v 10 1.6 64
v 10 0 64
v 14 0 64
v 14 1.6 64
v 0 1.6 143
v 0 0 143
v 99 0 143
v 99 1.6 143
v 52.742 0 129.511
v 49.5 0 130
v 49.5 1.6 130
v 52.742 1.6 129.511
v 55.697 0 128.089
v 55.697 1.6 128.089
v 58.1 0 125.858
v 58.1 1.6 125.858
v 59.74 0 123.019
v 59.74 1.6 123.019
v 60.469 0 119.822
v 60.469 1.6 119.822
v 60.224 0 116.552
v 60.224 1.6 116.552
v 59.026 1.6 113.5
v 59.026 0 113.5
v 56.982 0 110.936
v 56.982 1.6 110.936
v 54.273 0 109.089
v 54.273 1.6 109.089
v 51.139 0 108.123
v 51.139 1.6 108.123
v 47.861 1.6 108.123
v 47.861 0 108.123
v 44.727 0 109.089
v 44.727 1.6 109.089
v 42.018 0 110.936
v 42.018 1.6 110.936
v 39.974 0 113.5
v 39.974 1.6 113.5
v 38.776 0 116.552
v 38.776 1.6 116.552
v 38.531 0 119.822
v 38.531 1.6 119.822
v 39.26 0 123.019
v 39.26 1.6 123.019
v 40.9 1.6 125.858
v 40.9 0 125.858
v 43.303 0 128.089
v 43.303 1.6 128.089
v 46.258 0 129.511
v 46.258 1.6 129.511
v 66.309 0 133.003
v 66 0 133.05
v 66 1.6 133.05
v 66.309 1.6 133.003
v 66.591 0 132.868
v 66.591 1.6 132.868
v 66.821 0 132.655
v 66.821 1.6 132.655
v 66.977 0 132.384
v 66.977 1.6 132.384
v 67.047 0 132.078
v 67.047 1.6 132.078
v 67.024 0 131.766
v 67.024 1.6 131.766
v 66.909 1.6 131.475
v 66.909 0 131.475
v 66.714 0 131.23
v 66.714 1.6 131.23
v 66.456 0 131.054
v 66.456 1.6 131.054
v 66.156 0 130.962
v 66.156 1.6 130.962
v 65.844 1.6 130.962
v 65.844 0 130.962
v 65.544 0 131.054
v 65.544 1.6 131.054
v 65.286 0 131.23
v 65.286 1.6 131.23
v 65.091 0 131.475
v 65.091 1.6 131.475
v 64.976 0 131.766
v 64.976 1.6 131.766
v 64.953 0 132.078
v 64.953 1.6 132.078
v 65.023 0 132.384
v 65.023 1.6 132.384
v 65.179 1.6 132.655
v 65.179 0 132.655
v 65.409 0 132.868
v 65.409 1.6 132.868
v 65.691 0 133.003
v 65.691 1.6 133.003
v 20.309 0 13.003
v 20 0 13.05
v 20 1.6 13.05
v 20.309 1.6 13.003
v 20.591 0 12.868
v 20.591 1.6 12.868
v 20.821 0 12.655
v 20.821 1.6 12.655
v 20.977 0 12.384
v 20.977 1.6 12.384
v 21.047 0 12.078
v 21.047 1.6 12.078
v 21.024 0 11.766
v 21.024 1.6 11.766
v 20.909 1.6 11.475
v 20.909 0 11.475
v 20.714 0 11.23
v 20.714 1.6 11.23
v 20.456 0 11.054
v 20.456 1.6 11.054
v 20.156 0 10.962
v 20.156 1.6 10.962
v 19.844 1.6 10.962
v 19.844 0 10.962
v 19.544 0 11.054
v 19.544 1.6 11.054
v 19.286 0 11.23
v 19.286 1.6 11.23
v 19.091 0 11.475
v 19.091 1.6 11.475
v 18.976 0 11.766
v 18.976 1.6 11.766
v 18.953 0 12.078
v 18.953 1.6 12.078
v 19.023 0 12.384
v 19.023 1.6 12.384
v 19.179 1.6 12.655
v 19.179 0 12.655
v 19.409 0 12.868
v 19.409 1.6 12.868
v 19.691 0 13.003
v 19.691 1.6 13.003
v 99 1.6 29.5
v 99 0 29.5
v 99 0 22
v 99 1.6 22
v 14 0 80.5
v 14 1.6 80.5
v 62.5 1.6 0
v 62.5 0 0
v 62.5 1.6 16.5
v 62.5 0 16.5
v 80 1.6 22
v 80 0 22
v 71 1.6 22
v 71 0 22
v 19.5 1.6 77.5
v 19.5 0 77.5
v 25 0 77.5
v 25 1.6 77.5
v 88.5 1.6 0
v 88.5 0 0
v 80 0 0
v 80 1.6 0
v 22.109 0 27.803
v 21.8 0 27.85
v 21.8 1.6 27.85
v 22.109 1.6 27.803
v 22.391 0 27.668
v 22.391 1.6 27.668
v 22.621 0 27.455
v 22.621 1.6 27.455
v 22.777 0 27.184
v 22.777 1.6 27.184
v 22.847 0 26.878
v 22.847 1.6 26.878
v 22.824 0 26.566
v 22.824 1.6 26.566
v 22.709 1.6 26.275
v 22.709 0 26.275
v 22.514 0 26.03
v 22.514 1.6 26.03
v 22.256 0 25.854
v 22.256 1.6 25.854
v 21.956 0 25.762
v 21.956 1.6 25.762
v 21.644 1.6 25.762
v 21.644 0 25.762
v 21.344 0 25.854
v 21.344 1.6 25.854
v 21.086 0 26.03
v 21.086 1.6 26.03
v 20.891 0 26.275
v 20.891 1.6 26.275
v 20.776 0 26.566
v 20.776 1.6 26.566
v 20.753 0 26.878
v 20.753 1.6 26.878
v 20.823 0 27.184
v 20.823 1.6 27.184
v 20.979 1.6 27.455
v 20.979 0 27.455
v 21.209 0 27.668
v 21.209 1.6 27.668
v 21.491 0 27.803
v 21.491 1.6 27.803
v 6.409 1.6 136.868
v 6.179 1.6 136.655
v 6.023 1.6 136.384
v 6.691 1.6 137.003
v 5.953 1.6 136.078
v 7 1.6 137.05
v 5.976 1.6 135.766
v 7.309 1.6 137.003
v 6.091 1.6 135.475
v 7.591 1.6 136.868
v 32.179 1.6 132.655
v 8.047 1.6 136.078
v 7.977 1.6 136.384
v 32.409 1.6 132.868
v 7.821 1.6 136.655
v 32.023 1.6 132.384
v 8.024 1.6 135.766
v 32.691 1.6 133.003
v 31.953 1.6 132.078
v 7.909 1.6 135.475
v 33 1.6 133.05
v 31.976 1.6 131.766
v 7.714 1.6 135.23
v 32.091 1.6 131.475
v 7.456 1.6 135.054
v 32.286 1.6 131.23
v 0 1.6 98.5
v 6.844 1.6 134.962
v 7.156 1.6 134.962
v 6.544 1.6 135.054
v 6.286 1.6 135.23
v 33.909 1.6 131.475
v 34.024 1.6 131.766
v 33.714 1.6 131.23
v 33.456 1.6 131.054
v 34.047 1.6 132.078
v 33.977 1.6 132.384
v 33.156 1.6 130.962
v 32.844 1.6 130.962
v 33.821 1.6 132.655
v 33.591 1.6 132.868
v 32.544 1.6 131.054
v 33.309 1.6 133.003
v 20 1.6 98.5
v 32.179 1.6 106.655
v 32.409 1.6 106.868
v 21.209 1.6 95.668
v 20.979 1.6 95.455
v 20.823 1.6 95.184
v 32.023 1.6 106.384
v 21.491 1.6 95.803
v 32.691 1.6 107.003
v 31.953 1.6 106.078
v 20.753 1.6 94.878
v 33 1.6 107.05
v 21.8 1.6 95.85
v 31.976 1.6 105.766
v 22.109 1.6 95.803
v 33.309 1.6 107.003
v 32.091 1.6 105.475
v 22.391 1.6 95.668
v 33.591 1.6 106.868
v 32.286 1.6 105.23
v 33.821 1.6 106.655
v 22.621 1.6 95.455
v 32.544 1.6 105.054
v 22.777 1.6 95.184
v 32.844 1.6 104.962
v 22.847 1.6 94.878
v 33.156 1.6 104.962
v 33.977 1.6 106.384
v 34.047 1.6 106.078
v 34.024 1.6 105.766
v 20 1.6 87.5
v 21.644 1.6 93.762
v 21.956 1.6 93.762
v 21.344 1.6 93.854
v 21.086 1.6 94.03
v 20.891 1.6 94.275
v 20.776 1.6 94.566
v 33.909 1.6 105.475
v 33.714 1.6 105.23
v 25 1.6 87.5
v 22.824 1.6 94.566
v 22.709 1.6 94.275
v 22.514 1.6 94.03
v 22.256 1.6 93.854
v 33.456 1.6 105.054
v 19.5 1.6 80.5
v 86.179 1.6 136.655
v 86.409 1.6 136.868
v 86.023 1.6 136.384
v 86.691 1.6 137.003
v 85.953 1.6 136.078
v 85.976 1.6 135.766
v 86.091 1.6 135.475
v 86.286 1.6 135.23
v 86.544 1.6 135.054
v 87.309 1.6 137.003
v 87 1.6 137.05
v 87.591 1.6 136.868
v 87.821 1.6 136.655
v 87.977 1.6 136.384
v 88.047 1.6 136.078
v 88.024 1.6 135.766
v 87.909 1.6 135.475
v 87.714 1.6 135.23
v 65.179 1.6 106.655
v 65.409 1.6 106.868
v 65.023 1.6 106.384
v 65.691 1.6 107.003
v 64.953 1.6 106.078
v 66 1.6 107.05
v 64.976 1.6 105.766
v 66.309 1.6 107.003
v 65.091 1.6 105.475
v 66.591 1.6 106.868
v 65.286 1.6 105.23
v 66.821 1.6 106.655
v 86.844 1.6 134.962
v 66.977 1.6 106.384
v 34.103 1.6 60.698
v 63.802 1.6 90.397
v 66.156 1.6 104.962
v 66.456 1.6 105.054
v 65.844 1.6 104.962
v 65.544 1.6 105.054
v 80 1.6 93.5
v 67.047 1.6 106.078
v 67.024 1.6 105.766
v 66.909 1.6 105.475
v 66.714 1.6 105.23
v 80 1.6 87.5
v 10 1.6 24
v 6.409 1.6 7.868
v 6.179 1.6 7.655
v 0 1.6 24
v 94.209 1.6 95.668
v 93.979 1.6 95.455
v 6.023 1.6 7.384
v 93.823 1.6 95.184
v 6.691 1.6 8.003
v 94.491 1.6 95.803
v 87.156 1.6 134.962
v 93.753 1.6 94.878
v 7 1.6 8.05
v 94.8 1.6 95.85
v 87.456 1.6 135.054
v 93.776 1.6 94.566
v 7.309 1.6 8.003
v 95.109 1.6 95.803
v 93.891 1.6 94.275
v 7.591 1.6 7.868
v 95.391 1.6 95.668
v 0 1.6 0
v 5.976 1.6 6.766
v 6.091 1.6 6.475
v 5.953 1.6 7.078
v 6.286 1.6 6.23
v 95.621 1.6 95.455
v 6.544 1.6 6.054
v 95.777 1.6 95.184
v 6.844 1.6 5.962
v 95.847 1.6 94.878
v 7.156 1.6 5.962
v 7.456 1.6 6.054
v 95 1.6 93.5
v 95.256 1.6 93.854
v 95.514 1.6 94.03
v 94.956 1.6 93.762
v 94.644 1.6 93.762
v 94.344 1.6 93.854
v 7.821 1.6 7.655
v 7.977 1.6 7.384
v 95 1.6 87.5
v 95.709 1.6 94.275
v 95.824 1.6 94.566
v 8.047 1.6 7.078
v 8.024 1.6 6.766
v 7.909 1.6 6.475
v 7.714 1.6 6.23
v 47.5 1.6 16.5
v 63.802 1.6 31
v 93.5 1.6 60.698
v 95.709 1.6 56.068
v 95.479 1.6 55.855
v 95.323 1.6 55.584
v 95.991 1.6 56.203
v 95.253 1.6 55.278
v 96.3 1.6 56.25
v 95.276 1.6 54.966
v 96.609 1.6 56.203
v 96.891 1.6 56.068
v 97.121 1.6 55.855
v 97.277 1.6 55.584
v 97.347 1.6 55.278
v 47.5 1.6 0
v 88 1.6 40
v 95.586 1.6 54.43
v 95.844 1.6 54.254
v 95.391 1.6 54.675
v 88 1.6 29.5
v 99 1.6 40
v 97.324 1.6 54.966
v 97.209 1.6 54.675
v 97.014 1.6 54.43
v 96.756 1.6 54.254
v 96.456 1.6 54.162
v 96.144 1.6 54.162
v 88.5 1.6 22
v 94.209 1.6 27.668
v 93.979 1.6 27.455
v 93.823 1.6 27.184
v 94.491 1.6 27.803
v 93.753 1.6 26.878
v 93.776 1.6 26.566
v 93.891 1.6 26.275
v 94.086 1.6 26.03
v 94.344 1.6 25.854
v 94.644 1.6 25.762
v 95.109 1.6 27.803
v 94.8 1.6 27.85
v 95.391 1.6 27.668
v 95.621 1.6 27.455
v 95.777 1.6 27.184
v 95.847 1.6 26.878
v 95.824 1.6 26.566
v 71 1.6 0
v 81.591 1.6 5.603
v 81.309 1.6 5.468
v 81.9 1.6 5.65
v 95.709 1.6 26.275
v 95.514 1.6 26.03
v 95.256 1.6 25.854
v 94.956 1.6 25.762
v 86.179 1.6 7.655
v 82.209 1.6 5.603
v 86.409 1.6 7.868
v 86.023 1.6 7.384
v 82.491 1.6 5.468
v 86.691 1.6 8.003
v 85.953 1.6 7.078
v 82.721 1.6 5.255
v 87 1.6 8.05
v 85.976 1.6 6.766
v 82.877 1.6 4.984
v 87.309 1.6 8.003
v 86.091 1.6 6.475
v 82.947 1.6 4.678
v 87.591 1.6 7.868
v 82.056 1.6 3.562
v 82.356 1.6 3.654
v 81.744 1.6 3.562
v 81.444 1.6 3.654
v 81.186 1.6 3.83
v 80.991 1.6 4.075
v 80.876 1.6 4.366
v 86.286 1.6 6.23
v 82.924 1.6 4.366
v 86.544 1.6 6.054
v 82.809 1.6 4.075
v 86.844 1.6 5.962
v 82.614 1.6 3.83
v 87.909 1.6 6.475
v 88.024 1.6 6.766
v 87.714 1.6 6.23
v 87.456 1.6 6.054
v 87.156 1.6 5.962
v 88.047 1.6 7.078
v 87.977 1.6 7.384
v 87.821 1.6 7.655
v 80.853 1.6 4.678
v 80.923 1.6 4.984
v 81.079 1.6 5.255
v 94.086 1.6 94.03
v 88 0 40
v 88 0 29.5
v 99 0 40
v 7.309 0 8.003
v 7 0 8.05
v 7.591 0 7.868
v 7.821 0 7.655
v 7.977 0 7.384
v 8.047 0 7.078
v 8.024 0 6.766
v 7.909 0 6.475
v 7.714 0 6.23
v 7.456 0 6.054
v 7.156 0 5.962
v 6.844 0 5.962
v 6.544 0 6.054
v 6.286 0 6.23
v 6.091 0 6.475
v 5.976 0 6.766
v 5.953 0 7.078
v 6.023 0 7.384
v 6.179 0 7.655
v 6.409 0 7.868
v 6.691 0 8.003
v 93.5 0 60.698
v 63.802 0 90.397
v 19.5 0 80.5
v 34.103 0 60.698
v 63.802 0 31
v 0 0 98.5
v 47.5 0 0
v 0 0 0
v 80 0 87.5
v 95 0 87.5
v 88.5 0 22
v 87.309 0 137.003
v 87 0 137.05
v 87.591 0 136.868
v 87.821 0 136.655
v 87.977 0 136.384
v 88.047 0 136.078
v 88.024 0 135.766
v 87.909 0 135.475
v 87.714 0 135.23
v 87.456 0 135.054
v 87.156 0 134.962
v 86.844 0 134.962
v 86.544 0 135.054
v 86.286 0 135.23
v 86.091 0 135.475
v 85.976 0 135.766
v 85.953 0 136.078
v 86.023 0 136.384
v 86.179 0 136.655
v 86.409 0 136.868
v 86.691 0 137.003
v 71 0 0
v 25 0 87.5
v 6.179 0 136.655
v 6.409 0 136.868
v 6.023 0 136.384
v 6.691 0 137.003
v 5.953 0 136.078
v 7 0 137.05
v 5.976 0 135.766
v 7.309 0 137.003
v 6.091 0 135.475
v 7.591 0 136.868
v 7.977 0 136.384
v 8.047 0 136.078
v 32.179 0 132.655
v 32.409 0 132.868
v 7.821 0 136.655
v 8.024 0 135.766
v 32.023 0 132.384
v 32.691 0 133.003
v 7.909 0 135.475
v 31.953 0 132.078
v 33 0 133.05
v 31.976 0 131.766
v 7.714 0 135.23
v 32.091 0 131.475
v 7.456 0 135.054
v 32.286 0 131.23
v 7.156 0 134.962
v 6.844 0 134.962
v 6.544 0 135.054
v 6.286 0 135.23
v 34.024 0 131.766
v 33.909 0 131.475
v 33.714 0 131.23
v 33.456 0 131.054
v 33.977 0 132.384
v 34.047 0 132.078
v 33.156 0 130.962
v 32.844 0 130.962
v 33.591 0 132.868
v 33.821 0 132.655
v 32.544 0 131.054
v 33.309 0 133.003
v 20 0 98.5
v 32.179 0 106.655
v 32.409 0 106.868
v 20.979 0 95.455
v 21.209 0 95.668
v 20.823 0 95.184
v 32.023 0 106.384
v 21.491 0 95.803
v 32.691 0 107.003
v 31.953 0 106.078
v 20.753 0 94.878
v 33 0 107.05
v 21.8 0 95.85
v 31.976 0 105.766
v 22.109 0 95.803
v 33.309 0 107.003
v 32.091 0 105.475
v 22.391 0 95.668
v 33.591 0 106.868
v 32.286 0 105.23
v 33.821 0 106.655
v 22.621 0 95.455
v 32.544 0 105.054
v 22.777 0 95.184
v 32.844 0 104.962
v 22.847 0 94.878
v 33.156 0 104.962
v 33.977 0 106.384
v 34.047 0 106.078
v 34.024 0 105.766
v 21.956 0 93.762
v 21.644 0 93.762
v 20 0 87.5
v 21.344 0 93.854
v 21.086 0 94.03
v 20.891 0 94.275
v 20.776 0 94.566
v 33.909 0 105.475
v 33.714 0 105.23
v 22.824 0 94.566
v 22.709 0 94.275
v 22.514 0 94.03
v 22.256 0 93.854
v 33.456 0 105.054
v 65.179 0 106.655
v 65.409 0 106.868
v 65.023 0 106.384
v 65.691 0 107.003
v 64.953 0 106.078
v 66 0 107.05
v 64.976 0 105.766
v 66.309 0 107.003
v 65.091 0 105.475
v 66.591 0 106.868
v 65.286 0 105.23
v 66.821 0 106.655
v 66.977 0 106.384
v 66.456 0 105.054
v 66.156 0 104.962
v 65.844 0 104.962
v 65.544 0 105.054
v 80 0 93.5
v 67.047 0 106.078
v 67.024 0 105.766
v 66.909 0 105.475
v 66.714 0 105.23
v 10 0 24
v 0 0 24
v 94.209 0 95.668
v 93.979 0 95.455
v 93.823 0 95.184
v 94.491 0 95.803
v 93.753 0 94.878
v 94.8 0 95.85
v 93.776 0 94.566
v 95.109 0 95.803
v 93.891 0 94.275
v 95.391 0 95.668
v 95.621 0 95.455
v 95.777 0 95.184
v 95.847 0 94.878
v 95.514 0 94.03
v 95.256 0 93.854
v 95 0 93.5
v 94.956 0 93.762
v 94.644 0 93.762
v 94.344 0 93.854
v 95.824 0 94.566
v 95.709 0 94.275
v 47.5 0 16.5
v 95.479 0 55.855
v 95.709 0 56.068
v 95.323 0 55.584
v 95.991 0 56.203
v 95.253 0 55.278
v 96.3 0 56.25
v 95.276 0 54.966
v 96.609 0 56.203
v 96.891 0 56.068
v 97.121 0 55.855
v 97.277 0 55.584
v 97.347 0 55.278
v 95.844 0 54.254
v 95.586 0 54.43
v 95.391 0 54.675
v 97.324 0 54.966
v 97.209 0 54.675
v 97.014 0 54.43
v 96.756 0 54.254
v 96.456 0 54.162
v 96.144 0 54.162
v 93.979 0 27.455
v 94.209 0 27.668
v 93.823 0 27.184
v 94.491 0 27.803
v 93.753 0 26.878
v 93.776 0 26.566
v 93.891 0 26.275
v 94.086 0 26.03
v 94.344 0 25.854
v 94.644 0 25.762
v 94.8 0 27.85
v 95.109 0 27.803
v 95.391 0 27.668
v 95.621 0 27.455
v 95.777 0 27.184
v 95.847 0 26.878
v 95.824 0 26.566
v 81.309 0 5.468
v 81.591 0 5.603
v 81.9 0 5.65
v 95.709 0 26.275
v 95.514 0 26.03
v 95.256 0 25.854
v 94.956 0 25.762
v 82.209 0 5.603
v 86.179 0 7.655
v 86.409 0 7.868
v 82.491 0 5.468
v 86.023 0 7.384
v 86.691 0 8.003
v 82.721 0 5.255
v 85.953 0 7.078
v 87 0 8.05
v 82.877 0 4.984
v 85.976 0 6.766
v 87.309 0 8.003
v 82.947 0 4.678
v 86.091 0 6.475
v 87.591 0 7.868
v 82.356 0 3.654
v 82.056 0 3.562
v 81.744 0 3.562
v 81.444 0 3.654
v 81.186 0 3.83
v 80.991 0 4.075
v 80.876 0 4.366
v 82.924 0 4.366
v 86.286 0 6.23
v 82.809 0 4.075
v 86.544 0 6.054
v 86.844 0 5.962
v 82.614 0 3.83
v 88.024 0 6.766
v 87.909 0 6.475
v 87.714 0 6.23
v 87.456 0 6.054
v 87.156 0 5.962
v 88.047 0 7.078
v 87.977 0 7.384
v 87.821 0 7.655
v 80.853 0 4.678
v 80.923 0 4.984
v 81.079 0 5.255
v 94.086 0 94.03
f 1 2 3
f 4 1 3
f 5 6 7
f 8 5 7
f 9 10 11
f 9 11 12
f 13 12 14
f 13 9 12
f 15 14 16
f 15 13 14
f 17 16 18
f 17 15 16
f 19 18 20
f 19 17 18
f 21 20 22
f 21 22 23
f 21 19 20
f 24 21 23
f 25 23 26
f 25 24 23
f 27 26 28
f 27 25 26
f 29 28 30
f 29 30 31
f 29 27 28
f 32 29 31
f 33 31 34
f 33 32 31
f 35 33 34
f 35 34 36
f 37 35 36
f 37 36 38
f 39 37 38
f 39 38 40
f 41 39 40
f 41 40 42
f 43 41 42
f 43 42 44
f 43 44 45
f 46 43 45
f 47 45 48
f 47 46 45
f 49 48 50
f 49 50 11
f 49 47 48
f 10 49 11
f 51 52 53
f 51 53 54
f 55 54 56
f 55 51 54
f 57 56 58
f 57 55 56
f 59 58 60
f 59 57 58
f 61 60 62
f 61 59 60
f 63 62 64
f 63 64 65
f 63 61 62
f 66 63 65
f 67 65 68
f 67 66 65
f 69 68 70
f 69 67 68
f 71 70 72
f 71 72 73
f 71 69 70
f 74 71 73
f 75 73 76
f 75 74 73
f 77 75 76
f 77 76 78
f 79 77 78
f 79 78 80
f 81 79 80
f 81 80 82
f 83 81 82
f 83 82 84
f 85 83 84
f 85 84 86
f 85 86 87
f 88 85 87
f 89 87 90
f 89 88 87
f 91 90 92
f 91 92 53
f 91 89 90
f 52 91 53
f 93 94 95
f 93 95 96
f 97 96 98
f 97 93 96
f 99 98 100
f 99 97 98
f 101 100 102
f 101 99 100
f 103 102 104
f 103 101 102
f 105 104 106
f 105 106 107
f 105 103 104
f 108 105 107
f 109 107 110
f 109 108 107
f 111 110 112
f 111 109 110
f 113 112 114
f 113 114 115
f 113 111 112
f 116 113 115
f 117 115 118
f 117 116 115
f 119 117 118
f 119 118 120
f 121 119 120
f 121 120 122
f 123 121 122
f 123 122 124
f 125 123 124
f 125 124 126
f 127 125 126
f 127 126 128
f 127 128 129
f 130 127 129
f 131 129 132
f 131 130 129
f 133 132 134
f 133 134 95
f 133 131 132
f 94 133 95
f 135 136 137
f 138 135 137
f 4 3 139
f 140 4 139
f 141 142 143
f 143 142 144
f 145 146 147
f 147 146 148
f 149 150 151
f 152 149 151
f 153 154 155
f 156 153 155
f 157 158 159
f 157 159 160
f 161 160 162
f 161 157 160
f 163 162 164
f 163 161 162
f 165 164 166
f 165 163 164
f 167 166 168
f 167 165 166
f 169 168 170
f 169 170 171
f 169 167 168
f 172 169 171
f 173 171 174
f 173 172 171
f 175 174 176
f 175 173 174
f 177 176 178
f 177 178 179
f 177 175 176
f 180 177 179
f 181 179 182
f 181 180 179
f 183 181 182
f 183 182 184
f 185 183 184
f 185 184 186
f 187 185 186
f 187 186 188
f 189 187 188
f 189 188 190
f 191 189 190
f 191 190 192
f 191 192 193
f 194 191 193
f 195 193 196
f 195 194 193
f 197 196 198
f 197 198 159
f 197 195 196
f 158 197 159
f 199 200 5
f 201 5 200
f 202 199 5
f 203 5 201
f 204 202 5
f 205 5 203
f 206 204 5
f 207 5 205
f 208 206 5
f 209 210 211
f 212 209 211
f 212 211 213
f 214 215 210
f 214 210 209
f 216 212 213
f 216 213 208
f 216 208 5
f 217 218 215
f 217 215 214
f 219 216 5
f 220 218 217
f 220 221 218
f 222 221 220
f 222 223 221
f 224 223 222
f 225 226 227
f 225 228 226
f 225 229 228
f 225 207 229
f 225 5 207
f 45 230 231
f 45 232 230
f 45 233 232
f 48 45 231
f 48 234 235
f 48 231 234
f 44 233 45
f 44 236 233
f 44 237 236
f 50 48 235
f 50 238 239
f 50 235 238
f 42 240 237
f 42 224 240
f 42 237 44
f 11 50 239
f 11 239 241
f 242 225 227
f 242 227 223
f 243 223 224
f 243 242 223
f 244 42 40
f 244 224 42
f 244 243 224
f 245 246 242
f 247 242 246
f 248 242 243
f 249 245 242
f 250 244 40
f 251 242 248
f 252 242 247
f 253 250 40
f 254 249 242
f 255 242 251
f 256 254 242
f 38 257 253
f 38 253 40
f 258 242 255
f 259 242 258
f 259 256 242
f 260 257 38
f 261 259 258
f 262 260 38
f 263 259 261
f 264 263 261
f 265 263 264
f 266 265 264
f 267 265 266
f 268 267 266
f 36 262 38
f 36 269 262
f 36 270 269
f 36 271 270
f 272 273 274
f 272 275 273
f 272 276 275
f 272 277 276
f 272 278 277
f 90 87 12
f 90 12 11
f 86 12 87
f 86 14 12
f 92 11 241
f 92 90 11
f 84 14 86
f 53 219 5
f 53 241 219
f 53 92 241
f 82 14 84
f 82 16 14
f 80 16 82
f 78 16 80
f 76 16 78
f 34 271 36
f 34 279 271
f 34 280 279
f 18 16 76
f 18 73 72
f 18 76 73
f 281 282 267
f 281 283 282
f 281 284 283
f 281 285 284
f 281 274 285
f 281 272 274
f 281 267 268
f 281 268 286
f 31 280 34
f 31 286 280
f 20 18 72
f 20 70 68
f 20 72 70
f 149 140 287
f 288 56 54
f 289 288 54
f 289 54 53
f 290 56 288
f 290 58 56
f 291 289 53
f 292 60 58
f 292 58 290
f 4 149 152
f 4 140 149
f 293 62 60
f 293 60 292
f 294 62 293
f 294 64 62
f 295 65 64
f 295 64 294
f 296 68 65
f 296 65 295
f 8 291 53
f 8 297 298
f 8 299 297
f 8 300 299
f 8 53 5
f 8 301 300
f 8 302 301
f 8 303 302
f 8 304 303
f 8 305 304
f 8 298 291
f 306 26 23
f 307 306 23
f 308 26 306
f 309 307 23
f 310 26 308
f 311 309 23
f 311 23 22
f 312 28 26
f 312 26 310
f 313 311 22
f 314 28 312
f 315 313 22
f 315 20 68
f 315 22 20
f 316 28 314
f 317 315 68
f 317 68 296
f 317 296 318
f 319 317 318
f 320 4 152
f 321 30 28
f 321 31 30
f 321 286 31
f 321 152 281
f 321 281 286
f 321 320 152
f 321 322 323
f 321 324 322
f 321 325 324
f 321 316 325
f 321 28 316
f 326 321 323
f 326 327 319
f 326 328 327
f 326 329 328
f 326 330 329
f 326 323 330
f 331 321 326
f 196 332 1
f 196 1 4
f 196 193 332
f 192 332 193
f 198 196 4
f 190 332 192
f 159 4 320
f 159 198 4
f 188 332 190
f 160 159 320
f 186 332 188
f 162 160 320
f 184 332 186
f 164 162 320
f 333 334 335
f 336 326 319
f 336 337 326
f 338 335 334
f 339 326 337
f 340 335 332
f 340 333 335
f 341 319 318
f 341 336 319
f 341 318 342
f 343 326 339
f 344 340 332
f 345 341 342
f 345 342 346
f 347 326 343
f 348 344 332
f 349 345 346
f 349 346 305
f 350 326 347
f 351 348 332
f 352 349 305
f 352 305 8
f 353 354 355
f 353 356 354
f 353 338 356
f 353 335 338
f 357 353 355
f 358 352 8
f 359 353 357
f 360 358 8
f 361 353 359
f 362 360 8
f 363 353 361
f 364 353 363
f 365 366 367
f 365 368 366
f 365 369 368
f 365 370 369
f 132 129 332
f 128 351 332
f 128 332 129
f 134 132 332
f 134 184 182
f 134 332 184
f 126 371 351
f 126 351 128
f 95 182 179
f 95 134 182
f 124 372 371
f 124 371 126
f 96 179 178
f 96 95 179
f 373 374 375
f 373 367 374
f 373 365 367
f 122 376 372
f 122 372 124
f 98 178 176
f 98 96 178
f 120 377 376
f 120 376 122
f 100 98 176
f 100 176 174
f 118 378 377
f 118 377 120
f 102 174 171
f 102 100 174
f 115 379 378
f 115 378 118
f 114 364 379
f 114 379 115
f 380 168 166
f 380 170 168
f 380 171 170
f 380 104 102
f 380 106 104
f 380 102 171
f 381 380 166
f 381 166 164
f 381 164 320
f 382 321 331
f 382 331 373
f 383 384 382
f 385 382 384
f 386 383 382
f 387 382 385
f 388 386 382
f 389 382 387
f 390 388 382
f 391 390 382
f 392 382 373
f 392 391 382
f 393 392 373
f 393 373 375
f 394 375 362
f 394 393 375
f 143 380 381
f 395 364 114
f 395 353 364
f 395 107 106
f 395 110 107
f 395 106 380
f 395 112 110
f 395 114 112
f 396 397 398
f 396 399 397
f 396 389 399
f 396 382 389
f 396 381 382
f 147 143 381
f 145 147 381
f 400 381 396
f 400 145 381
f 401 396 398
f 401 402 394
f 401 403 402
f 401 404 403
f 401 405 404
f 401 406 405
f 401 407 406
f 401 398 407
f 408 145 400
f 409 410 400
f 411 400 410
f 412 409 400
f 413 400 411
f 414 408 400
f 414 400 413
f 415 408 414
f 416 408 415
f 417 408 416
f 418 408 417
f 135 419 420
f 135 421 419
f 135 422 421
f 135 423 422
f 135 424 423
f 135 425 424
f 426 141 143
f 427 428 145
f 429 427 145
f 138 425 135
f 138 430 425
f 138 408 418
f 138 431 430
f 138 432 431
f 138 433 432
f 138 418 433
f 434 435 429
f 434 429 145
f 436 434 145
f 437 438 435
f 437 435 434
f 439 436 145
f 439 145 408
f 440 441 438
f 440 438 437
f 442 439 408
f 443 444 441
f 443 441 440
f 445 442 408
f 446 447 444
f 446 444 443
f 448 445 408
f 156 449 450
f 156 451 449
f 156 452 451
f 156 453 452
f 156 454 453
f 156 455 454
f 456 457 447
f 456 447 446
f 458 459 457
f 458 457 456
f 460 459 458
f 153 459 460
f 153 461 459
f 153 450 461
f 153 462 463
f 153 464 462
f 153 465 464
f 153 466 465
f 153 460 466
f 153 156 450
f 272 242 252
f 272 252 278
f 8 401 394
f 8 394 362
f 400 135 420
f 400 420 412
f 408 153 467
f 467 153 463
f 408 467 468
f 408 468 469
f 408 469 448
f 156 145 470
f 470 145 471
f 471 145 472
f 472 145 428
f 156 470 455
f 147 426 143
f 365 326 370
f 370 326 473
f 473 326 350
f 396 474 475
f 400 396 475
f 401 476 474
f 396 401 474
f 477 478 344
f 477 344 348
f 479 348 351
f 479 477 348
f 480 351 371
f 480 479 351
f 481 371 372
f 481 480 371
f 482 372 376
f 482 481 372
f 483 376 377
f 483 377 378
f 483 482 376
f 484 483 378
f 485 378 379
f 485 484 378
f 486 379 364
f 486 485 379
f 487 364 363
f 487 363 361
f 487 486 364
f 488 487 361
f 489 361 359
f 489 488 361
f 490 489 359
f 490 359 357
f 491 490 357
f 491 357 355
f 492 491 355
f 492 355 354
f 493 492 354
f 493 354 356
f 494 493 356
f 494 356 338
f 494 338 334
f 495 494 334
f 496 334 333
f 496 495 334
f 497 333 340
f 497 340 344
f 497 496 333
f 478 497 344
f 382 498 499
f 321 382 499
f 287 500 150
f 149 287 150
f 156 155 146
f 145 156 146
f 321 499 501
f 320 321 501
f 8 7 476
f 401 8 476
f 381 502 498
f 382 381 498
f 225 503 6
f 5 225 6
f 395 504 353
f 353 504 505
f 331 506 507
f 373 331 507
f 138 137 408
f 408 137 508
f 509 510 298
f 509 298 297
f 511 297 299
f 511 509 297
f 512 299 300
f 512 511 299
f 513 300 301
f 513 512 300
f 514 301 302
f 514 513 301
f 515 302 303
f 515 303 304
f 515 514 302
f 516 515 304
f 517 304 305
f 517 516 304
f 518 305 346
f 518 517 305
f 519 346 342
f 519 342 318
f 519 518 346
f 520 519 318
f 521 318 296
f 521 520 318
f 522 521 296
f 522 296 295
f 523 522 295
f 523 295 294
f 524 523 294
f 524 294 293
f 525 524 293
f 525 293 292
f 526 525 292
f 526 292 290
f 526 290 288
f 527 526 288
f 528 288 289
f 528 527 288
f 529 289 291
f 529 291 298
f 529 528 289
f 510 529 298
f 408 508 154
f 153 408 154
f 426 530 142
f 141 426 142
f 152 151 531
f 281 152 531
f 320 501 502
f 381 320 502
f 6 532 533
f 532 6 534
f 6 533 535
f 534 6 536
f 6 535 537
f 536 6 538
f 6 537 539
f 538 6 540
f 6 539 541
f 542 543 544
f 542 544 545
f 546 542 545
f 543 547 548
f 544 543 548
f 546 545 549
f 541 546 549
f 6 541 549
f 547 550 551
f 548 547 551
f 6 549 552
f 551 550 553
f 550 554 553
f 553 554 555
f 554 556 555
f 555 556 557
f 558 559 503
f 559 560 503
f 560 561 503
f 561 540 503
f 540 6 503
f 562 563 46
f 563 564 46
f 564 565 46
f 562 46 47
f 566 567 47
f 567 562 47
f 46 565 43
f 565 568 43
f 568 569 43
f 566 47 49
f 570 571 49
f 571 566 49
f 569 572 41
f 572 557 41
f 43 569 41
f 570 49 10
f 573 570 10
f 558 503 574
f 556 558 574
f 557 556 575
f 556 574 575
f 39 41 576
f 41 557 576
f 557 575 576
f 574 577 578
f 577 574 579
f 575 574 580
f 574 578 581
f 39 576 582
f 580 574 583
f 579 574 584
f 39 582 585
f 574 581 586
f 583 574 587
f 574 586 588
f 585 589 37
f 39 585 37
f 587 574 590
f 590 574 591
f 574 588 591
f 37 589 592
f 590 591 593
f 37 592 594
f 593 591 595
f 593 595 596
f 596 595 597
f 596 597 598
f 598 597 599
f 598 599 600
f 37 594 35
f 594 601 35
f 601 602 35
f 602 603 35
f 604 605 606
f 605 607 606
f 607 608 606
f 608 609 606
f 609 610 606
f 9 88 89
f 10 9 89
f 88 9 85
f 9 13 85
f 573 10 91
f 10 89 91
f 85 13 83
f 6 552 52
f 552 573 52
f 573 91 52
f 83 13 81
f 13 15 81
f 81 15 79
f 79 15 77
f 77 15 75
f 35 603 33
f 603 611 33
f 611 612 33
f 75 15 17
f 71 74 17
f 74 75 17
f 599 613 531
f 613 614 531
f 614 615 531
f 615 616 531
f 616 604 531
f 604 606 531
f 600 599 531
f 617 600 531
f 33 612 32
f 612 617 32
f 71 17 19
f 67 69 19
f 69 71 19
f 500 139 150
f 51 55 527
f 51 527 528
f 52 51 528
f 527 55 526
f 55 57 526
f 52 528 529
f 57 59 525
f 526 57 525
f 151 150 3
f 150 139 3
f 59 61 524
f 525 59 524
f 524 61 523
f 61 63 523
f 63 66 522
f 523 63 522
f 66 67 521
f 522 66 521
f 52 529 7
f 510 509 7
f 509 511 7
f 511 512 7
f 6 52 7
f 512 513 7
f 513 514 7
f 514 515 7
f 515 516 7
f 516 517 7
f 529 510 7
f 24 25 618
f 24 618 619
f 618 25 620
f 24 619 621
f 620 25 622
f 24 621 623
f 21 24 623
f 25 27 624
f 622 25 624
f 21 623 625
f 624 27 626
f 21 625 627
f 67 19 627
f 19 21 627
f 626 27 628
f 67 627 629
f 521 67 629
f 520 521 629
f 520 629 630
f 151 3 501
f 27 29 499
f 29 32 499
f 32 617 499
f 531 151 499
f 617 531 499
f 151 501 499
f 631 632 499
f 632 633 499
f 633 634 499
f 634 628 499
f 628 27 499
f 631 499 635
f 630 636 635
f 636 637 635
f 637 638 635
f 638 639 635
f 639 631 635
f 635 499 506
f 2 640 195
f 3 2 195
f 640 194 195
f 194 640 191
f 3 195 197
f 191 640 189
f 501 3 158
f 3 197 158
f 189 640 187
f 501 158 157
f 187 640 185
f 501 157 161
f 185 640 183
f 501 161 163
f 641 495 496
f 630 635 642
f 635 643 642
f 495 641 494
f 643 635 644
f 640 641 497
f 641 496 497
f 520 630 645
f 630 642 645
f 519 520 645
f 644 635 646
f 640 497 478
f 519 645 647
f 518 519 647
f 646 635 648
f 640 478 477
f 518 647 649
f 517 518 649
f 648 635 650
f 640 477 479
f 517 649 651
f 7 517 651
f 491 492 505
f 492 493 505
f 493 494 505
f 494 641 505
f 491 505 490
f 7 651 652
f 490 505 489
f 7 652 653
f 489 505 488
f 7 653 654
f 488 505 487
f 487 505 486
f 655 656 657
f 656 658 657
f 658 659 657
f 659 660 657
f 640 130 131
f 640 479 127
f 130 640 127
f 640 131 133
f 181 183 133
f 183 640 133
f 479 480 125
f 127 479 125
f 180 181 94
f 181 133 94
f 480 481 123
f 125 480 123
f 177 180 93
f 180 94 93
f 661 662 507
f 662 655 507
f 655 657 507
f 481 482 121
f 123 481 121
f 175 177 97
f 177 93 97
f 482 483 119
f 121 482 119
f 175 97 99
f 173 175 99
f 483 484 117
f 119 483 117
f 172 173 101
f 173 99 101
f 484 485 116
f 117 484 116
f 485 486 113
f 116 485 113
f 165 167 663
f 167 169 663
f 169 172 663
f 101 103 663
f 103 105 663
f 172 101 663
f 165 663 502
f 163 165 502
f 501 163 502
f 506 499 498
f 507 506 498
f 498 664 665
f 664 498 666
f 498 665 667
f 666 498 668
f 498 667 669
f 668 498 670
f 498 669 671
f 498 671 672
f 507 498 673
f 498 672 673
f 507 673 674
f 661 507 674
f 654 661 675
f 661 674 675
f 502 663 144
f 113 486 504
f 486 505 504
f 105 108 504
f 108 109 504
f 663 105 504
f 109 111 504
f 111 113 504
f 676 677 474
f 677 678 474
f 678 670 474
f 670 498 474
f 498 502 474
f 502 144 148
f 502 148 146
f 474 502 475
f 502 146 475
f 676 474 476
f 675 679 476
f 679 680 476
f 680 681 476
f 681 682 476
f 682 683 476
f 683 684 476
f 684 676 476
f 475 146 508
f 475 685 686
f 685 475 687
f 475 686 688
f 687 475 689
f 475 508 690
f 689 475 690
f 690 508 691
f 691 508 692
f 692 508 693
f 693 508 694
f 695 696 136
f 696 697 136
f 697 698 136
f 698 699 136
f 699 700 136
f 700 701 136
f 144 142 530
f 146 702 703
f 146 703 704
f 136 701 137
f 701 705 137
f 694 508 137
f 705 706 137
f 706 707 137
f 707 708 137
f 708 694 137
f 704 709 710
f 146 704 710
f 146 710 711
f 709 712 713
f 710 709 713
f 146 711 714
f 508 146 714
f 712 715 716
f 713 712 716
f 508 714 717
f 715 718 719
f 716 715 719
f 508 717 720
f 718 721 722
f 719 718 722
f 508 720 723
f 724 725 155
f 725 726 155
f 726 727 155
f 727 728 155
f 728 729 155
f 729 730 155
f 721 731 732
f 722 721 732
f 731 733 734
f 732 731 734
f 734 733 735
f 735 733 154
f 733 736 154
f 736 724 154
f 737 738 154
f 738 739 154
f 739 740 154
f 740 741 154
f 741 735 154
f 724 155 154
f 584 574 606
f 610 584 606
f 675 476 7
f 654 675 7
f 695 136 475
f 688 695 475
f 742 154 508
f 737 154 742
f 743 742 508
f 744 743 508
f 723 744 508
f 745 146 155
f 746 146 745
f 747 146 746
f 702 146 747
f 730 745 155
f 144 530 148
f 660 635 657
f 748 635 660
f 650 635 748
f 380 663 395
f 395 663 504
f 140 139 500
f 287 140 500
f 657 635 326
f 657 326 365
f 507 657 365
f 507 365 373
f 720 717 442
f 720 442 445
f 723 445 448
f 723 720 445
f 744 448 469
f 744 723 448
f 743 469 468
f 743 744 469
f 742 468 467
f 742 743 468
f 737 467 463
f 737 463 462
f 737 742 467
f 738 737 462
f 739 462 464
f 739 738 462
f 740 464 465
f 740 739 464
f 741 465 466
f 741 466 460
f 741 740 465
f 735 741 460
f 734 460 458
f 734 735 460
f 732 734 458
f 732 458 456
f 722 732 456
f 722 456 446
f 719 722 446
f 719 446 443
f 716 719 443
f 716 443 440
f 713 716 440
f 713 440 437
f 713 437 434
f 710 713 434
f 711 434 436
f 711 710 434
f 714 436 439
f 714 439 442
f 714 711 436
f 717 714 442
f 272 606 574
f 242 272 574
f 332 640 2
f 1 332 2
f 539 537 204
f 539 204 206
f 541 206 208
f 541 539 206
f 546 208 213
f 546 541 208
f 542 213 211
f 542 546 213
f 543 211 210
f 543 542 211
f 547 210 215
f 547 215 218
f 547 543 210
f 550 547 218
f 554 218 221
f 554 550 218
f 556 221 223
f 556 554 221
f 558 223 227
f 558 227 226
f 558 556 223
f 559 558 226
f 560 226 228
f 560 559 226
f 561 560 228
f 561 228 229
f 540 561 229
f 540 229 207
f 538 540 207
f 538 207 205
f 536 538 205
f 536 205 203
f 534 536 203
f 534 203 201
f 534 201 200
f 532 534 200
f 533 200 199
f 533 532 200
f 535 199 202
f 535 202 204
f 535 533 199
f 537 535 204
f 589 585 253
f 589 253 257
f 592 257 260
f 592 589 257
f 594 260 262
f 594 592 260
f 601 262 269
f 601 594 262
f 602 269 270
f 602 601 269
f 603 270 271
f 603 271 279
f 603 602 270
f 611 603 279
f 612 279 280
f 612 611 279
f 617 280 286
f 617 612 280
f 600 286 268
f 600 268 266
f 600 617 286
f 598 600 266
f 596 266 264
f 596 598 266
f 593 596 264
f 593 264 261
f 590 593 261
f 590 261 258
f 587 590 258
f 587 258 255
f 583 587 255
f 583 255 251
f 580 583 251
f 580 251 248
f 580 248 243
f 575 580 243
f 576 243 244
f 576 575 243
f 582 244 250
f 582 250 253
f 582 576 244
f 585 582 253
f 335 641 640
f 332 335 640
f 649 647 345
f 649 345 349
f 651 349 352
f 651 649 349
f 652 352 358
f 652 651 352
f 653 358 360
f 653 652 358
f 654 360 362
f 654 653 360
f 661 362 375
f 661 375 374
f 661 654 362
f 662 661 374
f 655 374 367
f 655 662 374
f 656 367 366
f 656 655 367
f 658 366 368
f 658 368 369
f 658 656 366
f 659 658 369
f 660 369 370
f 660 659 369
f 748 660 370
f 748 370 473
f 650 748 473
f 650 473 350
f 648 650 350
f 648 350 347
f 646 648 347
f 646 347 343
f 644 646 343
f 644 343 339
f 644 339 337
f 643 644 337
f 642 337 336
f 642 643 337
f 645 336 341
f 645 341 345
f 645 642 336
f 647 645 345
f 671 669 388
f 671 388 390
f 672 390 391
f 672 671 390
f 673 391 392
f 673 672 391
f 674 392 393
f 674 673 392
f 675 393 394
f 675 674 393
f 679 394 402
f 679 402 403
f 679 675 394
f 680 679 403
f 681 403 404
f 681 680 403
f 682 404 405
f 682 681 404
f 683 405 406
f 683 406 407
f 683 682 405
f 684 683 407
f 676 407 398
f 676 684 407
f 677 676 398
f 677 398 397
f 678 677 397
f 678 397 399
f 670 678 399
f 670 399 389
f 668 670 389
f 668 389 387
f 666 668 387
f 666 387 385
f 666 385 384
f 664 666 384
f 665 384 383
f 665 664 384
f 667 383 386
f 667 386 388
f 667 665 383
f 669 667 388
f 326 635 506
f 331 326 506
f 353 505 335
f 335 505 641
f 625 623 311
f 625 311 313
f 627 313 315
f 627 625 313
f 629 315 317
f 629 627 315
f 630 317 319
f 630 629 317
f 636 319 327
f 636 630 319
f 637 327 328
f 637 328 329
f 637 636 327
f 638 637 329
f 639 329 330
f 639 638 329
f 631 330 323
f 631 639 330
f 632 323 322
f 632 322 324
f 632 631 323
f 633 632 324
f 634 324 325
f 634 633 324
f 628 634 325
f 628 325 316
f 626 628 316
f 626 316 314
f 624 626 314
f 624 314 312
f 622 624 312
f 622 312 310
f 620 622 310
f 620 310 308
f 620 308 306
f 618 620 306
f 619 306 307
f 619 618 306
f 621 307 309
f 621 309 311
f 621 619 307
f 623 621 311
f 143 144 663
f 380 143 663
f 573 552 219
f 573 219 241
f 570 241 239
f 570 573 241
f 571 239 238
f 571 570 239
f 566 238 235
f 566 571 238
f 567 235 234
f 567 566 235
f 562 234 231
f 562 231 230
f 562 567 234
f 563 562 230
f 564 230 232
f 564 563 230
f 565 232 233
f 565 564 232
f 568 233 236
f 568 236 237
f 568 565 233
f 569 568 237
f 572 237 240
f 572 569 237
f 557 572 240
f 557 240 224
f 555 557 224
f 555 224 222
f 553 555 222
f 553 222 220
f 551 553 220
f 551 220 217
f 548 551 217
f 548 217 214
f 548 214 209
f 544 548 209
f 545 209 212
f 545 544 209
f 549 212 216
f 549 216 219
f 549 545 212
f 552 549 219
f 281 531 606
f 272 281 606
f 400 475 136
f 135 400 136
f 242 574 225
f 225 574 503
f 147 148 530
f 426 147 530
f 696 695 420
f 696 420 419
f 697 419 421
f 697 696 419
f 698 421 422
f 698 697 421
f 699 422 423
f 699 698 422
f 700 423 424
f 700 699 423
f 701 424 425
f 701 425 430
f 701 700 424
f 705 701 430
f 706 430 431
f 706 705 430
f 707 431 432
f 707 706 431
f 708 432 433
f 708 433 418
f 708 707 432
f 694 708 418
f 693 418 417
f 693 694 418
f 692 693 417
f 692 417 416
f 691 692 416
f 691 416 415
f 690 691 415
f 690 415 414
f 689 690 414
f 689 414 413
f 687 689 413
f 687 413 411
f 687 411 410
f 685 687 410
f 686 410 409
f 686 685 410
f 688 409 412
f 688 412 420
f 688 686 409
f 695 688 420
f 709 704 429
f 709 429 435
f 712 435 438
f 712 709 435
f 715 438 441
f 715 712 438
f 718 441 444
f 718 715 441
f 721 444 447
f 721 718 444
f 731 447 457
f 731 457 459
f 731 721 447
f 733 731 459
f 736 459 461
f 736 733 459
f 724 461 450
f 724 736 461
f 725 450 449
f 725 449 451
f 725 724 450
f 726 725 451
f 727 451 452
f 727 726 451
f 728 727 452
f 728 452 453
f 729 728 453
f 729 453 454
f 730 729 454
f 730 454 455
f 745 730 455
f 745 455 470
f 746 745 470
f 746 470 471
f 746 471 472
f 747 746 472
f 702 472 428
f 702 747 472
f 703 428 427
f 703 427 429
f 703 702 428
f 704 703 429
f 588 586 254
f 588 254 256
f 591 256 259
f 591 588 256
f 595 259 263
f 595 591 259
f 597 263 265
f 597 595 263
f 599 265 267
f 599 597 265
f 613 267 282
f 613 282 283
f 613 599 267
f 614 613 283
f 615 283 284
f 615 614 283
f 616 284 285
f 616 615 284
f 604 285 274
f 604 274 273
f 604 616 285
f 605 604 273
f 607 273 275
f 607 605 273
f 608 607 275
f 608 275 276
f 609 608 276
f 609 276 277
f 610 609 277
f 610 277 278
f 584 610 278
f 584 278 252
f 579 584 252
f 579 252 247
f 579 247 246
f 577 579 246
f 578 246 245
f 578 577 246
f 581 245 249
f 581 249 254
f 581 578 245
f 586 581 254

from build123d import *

# Parameters (mm, degrees)
SKETCH_1_R      = 1.05
SKETCH_1_W      = 15
SKETCH_1_H      = 6
SKETCH_1_R_2    = 11
EXTRUDE_1_DEPTH = 1.6


with BuildPart() as part:
    # 草图1 → 凸台-拉伸1 (new body)
    with BuildSketch(Plane(origin=(0, 0, 0), x_dir=(1, 0, 0), z_dir=(0, 1, 0))):
        Polygon((47.5, 0), (0, 0), (0, -24), (10, -24), (10, -64), (14, -64), (14, -80.5), (19.5, -80.5), (19.5, -77.5), (25, -77.5), (25, -87.5), (20, -87.5), (20, -98.5), (0, -98.5), (0, -143), (99, -143), (99, -40), (88, -40), (88, -29.5), (99, -29.5), (99, -22), (88.5, -22), (88.5, 0), (80, 0), (80, -22), (71, -22), (71, 0), (62.5, 0), (62.5, -16.5), (47.5, -16.5), align=None)
        with Locations(Location((21.8, -94.8, 0), (0, 0, 270))):
            Circle(SKETCH_1_R, mode=Mode.SUBTRACT)
        with Locations((87.5, -90.5)):
            Rectangle(SKETCH_1_W, SKETCH_1_H, mode=Mode.SUBTRACT)
        with Locations(Location((94.8, -94.8, 0), (0, 0, 270))):
            Circle(SKETCH_1_R, mode=Mode.SUBTRACT)
        with Locations(Location((21.8, -26.8, 0), (0, 0, 270))):
            Circle(SKETCH_1_R, mode=Mode.SUBTRACT)
        with Locations(Location((7, -7, 0), (0, 0, 270))):
            Circle(SKETCH_1_R, mode=Mode.SUBTRACT)
        with Locations(Location((20, -12, 0), (0, 0, 270))):
            Circle(SKETCH_1_R, mode=Mode.SUBTRACT)
        Polygon((34.10303038, -60.69848481), (63.80151519, -31), (93.5, -60.69848481), (63.80151519, -90.39696962), align=None, mode=Mode.SUBTRACT)
        with Locations(Location((96.3, -55.2, 0), (0, 0, 270))):
            Circle(SKETCH_1_R, mode=Mode.SUBTRACT)
        with Locations(Location((94.8, -26.8, 0), (0, 0, 270))):
            Circle(SKETCH_1_R, mode=Mode.SUBTRACT)
        with Locations(Location((81.9, -4.6, 0), (0, 0, 270))):
            Circle(SKETCH_1_R, mode=Mode.SUBTRACT)
        with Locations(Location((87, -7, 0), (0, 0, 270))):
            Circle(SKETCH_1_R, mode=Mode.SUBTRACT)
        with Locations(Location((66, -106, 0), (0, 0, 270))):
            Circle(SKETCH_1_R, mode=Mode.SUBTRACT)
        with Locations(Location((7, -136, 0), (0, 0, 270))):
            Circle(SKETCH_1_R, mode=Mode.SUBTRACT)
        with Locations(Location((33, -132, 0), (0, 0, 270))):
            Circle(SKETCH_1_R, mode=Mode.SUBTRACT)
        with Locations(Location((33, -106, 0), (0, 0, 270))):
            Circle(SKETCH_1_R, mode=Mode.SUBTRACT)
        with Locations(Location((66, -132, 0), (0, 0, 270))):
            Circle(SKETCH_1_R, mode=Mode.SUBTRACT)
        with Locations(Location((49.5, -119, 0), (0, 0, 270))):
            Circle(SKETCH_1_R_2, mode=Mode.SUBTRACT)
        with Locations(Location((87, -136, 0), (0, 0, 270))):
            Circle(SKETCH_1_R, mode=Mode.SUBTRACT)
    extrude(amount=EXTRUDE_1_DEPTH)


solid = part.part
